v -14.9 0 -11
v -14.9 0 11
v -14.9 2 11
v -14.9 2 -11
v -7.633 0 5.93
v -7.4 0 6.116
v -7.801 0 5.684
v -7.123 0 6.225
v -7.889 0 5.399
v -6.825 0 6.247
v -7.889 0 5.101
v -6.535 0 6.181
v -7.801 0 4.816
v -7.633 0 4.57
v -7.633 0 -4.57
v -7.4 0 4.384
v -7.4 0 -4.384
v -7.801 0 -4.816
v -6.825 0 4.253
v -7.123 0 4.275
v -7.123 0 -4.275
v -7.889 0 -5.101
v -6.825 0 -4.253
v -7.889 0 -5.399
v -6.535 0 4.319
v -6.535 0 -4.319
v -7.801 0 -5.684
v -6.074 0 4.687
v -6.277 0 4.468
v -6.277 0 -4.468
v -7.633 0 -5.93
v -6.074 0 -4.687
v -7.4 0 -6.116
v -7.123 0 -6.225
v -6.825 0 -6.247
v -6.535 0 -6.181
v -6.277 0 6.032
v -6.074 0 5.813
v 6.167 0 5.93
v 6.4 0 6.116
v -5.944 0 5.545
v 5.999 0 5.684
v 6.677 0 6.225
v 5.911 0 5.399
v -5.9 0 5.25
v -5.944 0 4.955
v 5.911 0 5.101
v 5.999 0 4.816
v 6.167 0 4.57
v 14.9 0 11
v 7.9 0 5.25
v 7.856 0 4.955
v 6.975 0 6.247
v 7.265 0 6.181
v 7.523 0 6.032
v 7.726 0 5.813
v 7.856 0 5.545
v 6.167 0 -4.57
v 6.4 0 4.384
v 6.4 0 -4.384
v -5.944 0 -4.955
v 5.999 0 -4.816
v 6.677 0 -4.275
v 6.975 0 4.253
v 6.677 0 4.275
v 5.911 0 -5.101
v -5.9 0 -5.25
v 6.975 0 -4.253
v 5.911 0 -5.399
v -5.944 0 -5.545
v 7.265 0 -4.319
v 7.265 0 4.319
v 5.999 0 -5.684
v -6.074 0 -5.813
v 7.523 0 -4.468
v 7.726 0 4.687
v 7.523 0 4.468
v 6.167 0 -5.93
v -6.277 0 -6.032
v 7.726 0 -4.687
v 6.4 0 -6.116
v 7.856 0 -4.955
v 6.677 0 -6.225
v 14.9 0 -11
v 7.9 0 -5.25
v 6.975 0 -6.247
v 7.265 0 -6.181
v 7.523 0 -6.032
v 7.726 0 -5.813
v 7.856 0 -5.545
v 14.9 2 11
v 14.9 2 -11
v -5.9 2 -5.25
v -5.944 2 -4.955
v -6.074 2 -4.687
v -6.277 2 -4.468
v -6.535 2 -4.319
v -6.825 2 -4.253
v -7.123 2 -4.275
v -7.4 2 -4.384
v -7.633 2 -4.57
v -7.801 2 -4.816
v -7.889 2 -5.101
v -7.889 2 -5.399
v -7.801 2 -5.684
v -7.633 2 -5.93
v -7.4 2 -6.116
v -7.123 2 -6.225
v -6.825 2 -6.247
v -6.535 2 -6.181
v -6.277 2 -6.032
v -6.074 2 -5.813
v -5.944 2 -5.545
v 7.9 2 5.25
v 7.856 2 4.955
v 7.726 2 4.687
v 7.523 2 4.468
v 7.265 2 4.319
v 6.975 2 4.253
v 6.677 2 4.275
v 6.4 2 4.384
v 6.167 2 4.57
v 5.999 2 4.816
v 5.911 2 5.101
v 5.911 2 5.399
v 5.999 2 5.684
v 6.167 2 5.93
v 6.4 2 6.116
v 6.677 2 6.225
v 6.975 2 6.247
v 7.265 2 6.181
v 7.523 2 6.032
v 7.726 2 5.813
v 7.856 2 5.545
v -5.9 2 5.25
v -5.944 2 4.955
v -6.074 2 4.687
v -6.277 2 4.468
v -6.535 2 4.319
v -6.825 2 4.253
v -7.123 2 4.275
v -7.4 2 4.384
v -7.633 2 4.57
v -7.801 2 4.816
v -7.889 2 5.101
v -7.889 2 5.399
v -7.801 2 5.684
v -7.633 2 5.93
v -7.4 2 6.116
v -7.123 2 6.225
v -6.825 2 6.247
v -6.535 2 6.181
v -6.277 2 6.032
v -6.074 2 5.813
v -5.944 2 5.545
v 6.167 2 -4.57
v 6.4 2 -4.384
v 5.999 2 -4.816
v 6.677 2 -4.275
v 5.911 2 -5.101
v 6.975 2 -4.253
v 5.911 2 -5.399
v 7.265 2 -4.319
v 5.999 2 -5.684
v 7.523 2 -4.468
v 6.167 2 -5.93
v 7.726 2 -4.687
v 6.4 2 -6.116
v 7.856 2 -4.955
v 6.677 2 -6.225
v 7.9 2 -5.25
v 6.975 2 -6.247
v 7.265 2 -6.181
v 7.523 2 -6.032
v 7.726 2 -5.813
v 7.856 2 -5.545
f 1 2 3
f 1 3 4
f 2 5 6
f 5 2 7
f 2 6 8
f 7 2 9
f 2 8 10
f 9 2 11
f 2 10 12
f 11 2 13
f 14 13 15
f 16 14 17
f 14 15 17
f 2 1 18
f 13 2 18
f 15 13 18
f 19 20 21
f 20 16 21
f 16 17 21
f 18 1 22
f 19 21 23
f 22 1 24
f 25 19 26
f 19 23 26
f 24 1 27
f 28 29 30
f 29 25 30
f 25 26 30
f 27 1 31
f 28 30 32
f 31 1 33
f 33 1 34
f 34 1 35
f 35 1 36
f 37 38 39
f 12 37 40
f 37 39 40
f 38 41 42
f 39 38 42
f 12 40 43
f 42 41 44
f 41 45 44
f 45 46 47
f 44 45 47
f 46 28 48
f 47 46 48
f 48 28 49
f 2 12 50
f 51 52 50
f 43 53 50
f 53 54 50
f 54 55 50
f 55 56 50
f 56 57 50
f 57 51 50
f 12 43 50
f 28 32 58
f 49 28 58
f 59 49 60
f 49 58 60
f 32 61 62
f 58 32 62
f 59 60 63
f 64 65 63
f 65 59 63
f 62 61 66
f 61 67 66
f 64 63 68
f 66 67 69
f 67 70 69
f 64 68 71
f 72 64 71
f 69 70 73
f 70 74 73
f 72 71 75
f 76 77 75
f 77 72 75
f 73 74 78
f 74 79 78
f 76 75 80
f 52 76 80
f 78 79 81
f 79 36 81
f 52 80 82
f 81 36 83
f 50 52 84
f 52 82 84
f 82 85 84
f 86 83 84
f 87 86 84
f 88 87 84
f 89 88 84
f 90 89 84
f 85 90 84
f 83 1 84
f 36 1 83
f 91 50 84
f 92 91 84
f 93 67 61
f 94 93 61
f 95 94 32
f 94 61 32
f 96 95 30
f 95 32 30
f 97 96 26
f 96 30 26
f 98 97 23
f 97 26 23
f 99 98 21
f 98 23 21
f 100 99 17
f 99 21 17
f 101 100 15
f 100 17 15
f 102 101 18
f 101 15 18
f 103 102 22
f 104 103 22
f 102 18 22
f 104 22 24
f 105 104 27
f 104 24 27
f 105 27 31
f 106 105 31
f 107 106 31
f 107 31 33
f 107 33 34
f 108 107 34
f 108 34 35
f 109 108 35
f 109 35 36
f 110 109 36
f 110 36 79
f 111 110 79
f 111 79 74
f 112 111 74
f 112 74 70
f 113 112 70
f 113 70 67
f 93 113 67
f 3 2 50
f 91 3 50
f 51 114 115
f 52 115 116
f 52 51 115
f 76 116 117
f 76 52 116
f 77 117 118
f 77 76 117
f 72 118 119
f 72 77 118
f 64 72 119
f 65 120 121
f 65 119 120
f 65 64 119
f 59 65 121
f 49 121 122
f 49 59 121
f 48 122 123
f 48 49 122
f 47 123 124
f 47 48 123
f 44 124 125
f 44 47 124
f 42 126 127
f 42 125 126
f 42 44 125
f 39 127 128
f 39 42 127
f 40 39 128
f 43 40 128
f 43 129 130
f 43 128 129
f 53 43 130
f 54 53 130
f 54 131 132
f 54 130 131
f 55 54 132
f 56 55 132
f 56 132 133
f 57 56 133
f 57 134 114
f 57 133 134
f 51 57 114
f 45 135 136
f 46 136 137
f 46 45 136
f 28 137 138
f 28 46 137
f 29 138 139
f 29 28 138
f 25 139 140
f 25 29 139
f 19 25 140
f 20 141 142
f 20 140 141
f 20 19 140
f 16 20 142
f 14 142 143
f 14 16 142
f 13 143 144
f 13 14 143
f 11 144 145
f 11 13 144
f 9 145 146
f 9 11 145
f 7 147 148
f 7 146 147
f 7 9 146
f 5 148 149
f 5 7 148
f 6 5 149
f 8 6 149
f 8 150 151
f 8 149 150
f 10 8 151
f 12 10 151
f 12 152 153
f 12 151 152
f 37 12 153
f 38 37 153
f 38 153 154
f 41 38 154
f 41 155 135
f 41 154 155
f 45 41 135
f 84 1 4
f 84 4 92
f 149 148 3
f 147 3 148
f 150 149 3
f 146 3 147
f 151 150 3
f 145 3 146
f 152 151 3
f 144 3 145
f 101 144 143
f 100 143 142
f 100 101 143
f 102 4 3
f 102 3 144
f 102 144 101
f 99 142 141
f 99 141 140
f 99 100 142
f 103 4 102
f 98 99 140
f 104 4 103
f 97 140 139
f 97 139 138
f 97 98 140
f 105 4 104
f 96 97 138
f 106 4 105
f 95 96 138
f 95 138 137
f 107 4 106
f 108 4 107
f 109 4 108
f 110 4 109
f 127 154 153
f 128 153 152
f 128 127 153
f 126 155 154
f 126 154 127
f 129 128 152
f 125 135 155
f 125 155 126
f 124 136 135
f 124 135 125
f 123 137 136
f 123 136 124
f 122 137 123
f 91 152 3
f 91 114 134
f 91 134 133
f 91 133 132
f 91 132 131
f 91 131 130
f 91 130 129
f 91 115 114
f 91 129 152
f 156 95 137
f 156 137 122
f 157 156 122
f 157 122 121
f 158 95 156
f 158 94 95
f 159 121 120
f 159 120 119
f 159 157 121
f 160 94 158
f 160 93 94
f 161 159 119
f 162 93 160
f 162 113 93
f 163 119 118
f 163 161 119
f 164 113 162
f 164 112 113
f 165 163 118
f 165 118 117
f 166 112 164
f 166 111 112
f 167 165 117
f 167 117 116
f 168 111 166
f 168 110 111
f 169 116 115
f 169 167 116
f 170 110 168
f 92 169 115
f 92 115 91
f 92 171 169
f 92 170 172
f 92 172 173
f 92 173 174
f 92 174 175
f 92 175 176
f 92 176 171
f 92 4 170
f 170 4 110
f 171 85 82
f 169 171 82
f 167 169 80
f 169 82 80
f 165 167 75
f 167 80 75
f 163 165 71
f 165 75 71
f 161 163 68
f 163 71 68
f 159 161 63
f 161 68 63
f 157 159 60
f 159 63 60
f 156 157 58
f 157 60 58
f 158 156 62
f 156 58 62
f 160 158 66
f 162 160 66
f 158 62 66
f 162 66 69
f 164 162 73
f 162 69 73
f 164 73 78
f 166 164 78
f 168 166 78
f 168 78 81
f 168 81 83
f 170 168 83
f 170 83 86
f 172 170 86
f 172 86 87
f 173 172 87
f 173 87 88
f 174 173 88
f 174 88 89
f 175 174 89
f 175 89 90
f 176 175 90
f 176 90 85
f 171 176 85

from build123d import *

# Parameters (mm, degrees)
SKETCH1_W           = 29.8
SKETCH1_H           = 22
BOSS_EXTRUDE1_DEPTH = 2
SKETCH2_R           = 1
CUT_EXTRUDE2_DEPTH  = 10


with BuildPart() as part:
    # Sketch1 → Boss-Extrude1 (new body)
    with BuildSketch(Plane(origin=(0, 0, 0), x_dir=(1, 0, 0), z_dir=(0, 1, 0))):
        Rectangle(SKETCH1_W, SKETCH1_H)
    extrude(amount=BOSS_EXTRUDE1_DEPTH)

    # Sketch2 → Cut-Extrude2 (cut)
    with BuildSketch(Plane.XZ):
        with Locations((6.9, -5.25)):
            Circle(SKETCH2_R)
        with Locations((-6.9, -5.25)):
            Circle(SKETCH2_R)
    cut_extrude2 = extrude(amount=-CUT_EXTRUDE2_DEPTH, mode=Mode.SUBTRACT)

    # Mirror1: Cut-Extrude2 across plane
    add(cut_extrude2.mirror(Plane(origin=(0, 0, 0), x_dir=(1, 0, 0), z_dir=(0, 0, -1))), mode=Mode.SUBTRACT)


solid = part.part
